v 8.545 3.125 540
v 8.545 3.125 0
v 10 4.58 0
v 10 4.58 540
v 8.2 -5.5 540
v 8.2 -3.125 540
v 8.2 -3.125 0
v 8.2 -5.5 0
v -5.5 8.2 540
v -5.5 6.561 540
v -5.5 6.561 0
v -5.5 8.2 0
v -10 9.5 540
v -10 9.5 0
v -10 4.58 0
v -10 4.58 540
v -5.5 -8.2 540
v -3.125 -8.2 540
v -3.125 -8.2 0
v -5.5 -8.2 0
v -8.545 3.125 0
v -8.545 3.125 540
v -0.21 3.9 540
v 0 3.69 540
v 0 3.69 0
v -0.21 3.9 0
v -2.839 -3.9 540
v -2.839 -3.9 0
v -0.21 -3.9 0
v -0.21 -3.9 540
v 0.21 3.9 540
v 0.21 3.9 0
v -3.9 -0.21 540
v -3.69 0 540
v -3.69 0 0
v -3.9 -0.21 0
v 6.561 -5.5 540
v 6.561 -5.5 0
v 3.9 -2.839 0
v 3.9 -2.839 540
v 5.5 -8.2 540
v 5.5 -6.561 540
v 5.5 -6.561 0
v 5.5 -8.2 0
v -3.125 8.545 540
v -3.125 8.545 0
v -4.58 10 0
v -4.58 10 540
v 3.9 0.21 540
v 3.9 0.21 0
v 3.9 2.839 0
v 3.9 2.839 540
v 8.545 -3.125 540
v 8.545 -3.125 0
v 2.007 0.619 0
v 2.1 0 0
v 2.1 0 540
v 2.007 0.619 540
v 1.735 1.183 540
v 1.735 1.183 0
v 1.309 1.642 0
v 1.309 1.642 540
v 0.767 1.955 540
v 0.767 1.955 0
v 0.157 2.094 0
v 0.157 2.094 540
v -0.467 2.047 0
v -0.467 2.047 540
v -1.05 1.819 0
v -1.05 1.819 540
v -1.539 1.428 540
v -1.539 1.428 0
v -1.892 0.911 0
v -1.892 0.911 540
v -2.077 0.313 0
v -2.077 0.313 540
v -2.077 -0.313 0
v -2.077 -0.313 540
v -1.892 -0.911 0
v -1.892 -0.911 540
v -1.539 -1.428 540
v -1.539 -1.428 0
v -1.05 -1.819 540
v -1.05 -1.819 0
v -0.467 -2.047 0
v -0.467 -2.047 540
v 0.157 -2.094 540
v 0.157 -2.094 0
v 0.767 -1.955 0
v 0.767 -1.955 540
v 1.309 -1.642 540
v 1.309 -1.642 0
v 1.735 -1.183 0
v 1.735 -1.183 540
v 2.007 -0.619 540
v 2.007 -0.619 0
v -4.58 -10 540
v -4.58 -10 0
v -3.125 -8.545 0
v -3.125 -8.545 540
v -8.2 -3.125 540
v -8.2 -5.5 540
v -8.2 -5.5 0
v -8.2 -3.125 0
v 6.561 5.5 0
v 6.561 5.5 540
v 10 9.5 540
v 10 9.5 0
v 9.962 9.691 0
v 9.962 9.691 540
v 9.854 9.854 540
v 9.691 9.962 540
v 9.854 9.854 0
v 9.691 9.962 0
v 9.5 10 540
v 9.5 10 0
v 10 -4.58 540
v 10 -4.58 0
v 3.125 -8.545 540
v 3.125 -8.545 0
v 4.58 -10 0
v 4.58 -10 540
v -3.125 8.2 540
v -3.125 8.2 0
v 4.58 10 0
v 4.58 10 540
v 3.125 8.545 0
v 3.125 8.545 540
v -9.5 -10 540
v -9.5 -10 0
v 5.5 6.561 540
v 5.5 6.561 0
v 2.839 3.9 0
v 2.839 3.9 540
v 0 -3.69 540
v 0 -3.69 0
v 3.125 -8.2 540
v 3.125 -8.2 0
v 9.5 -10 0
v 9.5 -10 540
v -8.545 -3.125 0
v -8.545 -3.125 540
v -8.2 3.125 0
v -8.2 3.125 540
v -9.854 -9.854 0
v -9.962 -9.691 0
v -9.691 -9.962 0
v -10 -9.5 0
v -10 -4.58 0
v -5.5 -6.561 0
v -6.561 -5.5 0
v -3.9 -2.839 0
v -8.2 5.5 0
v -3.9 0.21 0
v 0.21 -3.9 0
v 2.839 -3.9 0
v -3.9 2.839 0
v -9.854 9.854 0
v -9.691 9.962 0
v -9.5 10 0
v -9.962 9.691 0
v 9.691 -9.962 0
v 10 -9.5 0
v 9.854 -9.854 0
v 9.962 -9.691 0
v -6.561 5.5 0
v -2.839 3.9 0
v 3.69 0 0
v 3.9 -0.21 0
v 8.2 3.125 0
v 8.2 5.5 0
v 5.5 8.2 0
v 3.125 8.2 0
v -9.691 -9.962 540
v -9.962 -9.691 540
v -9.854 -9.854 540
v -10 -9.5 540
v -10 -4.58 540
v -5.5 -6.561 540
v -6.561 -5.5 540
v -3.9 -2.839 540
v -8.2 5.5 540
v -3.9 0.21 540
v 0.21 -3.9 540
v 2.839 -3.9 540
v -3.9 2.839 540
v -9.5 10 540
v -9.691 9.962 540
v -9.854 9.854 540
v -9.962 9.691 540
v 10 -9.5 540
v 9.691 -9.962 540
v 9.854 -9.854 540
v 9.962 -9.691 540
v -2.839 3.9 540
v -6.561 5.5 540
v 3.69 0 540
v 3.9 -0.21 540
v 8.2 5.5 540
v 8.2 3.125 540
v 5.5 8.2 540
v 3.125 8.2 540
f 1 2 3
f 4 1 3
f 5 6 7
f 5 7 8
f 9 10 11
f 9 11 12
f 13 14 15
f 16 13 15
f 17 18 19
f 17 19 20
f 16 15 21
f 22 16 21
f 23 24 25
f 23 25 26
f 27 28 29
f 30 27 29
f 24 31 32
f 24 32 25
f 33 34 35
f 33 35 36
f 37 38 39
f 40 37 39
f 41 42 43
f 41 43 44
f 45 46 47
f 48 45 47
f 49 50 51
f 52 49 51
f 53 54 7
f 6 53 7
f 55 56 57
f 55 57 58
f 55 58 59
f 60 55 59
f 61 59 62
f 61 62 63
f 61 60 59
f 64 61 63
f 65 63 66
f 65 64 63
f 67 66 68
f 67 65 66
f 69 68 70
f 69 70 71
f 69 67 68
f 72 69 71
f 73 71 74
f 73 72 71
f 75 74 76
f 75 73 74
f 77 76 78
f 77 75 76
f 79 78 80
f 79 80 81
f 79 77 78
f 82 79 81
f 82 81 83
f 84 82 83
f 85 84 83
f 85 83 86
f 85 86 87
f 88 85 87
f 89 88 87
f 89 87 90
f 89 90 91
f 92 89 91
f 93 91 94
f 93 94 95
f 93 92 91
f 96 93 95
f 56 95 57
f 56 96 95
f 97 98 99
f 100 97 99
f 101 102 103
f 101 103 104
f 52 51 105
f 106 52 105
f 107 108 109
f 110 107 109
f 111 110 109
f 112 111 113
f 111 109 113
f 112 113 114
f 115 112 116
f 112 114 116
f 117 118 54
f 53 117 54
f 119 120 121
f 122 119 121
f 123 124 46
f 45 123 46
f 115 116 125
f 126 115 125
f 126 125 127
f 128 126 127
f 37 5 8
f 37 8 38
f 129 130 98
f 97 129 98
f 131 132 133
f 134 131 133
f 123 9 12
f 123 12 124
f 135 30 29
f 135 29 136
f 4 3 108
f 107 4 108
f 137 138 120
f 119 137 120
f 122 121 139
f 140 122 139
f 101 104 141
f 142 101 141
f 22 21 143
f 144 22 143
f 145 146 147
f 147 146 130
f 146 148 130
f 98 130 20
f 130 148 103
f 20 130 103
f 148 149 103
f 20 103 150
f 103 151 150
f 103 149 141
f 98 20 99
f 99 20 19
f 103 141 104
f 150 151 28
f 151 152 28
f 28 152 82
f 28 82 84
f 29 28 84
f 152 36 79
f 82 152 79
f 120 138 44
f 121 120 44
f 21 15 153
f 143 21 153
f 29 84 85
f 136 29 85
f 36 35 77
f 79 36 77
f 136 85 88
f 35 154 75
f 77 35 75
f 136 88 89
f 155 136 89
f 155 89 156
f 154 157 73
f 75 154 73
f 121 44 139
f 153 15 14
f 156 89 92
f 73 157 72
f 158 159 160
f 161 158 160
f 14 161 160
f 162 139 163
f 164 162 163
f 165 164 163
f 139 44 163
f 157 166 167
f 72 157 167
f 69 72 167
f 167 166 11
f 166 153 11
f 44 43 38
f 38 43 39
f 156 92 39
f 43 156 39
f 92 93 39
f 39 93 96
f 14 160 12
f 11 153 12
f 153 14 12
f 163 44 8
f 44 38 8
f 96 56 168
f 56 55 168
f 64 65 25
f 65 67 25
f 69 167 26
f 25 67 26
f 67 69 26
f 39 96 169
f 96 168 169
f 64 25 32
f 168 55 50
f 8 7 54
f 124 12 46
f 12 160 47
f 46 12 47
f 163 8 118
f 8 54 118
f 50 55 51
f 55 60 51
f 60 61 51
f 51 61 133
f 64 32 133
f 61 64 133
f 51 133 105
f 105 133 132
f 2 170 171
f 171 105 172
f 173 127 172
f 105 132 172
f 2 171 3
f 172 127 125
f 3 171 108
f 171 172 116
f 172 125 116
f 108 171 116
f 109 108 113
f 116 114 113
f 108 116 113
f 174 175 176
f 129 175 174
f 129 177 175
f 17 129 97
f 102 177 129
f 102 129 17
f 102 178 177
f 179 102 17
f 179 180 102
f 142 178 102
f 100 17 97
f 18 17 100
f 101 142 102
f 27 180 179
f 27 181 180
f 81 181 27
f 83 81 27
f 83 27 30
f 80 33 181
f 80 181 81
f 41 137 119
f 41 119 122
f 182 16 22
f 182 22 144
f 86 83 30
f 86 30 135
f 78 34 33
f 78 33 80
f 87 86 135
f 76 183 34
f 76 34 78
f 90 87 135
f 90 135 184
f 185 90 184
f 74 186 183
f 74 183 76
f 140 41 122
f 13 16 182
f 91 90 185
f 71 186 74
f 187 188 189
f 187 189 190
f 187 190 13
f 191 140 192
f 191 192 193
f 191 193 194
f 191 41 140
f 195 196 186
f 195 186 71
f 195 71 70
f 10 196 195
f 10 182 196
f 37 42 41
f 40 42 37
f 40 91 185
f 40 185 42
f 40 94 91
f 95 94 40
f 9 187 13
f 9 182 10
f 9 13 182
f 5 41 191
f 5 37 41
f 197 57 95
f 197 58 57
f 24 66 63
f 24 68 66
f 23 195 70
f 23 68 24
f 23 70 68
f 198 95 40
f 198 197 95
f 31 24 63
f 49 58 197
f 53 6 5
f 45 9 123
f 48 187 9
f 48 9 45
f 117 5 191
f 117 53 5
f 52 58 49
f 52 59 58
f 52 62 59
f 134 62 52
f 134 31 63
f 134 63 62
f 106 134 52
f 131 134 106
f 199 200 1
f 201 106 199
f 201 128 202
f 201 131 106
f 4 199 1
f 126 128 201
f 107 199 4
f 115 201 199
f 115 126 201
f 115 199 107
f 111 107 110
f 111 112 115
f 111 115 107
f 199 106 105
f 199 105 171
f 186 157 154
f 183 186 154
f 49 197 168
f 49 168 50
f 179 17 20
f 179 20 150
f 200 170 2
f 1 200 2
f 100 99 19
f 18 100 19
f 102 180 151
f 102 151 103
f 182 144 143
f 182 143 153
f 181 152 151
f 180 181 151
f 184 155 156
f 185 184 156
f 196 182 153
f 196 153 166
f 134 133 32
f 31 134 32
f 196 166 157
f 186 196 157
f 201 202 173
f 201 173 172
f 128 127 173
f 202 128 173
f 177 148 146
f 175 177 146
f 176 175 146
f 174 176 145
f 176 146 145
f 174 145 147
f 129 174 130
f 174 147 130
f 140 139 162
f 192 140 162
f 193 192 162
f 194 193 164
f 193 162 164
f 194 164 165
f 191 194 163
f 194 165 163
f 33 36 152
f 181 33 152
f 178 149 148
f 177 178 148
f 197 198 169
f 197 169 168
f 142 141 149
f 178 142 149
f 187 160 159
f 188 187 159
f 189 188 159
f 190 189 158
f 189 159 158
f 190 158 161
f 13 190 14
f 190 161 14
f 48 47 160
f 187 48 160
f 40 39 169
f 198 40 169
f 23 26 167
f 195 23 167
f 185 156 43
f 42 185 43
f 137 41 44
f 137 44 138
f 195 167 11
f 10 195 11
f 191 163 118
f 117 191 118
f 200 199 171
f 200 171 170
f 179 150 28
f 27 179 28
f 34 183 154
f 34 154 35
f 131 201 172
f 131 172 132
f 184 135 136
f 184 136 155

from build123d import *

# Parameters (mm, degrees)
SKETCH1_R           = 2.1
BOSS_EXTRUDE1_DEPTH = 540


with BuildPart() as part:
    # Sketch1 → Boss-Extrude1 (new body)
    with BuildSketch(Plane.XY):
        with BuildLine():
            Line((4.58, -10), (9.5, -10))
            ThreePointArc((9.5, -10), (9.853553391, -9.853553391), (10, -9.5))
            Line((10, -9.5), (10, -4.58))
            Line((10, -4.58), (8.545, -3.125))
            Line((8.545, -3.125), (8.2, -3.125))
            Line((8.2, -3.125), (8.2, -5.5))
            Line((8.2, -5.5), (6.560660172, -5.5))
            Line((6.560660172, -5.5), (3.9, -2.839339828))
            Line((3.9, -2.839339828), (3.9, -0.21))
            Line((3.9, -0.21), (3.69, 0))
            Line((3.69, 0), (3.9, 0.21))
            Line((3.9, 0.21), (3.9, 2.839339828))
            Line((3.9, 2.839339828), (6.560660172, 5.5))
            Line((6.560660172, 5.5), (8.2, 5.5))
            Line((8.2, 5.5), (8.2, 3.125))
            Line((8.2, 3.125), (8.545, 3.125))
            Line((8.545, 3.125), (10, 4.58))
            Line((10, 4.58), (10, 9.5))
            ThreePointArc((10, 9.5), (9.853553391, 9.853553391), (9.5, 10))
            Line((9.5, 10), (4.58, 10))
            Line((4.58, 10), (3.125, 8.545))
            Line((3.125, 8.545), (3.125, 8.2))
            Line((3.125, 8.2), (5.5, 8.2))
            Line((5.5, 8.2), (5.5, 6.560660172))
            Line((5.5, 6.560660172), (2.839339828, 3.9))
            Line((2.839339828, 3.9), (0.21, 3.9))
            Line((0.21, 3.9), (0, 3.69))
            Line((0, 3.69), (-0.21, 3.9))
            Line((-0.21, 3.9), (-2.839339828, 3.9))
            Line((-2.839339828, 3.9), (-5.5, 6.560660172))
            Line((-5.5, 6.560660172), (-5.5, 8.2))
            Line((-5.5, 8.2), (-3.125, 8.2))
            Line((-3.125, 8.2), (-3.125, 8.545))
            Line((-3.125, 8.545), (-4.58, 10))
            Line((-4.58, 10), (-9.5, 10))
            ThreePointArc((-9.5, 10), (-9.853553391, 9.853553391), (-10, 9.5))
            Line((-10, 9.5), (-10, 4.58))
            Line((-10, 4.58), (-8.545, 3.125))
            Line((-8.545, 3.125), (-8.2, 3.125))
            Line((-8.2, 3.125), (-8.2, 5.5))
            Line((-8.2, 5.5), (-6.560660172, 5.5))
            Line((-6.560660172, 5.5), (-3.9, 2.839339828))
            Line((-3.9, 2.839339828), (-3.9, 0.21))
            Line((-3.9, 0.21), (-3.69, 0))
            Line((-3.69, 0), (-3.9, -0.21))
            Line((-3.9, -0.21), (-3.9, -2.839339828))
            Line((-3.9, -2.839339828), (-6.560660172, -5.5))
            Line((-6.560660172, -5.5), (-8.2, -5.5))
            Line((-8.2, -5.5), (-8.2, -3.125))
            Line((-8.2, -3.125), (-8.545, -3.125))
            Line((-8.545, -3.125), (-10, -4.58))
            Line((-10, -4.58), (-10, -9.5))
            ThreePointArc((-10, -9.5), (-9.853553391, -9.853553391), (-9.5, -10))
            Line((-9.5, -10), (-4.58, -10))
            Line((-4.58, -10), (-3.125, -8.545))
            Line((-3.125, -8.545), (-3.125, -8.2))
            Line((-3.125, -8.2), (-5.5, -8.2))
            Line((-5.5, -8.2), (-5.5, -6.560660172))
            Line((-5.5, -6.560660172), (-2.839339828, -3.9))
            Line((-2.839339828, -3.9), (-0.21, -3.9))
            Line((-0.21, -3.9), (0, -3.69))
            Line((0, -3.69), (0.21, -3.9))
            Line((0.21, -3.9), (2.839339828, -3.9))
            Line((2.839339828, -3.9), (5.5, -6.560660172))
            Line((5.5, -6.560660172), (5.5, -8.2))
            Line((5.5, -8.2), (3.125, -8.2))
            Line((3.125, -8.2), (3.125, -8.545))
            Line((3.125, -8.545), (4.58, -10))
        make_face()
        Circle(SKETCH1_R, mode=Mode.SUBTRACT)
    extrude(amount=BOSS_EXTRUDE1_DEPTH)


solid = part.part
